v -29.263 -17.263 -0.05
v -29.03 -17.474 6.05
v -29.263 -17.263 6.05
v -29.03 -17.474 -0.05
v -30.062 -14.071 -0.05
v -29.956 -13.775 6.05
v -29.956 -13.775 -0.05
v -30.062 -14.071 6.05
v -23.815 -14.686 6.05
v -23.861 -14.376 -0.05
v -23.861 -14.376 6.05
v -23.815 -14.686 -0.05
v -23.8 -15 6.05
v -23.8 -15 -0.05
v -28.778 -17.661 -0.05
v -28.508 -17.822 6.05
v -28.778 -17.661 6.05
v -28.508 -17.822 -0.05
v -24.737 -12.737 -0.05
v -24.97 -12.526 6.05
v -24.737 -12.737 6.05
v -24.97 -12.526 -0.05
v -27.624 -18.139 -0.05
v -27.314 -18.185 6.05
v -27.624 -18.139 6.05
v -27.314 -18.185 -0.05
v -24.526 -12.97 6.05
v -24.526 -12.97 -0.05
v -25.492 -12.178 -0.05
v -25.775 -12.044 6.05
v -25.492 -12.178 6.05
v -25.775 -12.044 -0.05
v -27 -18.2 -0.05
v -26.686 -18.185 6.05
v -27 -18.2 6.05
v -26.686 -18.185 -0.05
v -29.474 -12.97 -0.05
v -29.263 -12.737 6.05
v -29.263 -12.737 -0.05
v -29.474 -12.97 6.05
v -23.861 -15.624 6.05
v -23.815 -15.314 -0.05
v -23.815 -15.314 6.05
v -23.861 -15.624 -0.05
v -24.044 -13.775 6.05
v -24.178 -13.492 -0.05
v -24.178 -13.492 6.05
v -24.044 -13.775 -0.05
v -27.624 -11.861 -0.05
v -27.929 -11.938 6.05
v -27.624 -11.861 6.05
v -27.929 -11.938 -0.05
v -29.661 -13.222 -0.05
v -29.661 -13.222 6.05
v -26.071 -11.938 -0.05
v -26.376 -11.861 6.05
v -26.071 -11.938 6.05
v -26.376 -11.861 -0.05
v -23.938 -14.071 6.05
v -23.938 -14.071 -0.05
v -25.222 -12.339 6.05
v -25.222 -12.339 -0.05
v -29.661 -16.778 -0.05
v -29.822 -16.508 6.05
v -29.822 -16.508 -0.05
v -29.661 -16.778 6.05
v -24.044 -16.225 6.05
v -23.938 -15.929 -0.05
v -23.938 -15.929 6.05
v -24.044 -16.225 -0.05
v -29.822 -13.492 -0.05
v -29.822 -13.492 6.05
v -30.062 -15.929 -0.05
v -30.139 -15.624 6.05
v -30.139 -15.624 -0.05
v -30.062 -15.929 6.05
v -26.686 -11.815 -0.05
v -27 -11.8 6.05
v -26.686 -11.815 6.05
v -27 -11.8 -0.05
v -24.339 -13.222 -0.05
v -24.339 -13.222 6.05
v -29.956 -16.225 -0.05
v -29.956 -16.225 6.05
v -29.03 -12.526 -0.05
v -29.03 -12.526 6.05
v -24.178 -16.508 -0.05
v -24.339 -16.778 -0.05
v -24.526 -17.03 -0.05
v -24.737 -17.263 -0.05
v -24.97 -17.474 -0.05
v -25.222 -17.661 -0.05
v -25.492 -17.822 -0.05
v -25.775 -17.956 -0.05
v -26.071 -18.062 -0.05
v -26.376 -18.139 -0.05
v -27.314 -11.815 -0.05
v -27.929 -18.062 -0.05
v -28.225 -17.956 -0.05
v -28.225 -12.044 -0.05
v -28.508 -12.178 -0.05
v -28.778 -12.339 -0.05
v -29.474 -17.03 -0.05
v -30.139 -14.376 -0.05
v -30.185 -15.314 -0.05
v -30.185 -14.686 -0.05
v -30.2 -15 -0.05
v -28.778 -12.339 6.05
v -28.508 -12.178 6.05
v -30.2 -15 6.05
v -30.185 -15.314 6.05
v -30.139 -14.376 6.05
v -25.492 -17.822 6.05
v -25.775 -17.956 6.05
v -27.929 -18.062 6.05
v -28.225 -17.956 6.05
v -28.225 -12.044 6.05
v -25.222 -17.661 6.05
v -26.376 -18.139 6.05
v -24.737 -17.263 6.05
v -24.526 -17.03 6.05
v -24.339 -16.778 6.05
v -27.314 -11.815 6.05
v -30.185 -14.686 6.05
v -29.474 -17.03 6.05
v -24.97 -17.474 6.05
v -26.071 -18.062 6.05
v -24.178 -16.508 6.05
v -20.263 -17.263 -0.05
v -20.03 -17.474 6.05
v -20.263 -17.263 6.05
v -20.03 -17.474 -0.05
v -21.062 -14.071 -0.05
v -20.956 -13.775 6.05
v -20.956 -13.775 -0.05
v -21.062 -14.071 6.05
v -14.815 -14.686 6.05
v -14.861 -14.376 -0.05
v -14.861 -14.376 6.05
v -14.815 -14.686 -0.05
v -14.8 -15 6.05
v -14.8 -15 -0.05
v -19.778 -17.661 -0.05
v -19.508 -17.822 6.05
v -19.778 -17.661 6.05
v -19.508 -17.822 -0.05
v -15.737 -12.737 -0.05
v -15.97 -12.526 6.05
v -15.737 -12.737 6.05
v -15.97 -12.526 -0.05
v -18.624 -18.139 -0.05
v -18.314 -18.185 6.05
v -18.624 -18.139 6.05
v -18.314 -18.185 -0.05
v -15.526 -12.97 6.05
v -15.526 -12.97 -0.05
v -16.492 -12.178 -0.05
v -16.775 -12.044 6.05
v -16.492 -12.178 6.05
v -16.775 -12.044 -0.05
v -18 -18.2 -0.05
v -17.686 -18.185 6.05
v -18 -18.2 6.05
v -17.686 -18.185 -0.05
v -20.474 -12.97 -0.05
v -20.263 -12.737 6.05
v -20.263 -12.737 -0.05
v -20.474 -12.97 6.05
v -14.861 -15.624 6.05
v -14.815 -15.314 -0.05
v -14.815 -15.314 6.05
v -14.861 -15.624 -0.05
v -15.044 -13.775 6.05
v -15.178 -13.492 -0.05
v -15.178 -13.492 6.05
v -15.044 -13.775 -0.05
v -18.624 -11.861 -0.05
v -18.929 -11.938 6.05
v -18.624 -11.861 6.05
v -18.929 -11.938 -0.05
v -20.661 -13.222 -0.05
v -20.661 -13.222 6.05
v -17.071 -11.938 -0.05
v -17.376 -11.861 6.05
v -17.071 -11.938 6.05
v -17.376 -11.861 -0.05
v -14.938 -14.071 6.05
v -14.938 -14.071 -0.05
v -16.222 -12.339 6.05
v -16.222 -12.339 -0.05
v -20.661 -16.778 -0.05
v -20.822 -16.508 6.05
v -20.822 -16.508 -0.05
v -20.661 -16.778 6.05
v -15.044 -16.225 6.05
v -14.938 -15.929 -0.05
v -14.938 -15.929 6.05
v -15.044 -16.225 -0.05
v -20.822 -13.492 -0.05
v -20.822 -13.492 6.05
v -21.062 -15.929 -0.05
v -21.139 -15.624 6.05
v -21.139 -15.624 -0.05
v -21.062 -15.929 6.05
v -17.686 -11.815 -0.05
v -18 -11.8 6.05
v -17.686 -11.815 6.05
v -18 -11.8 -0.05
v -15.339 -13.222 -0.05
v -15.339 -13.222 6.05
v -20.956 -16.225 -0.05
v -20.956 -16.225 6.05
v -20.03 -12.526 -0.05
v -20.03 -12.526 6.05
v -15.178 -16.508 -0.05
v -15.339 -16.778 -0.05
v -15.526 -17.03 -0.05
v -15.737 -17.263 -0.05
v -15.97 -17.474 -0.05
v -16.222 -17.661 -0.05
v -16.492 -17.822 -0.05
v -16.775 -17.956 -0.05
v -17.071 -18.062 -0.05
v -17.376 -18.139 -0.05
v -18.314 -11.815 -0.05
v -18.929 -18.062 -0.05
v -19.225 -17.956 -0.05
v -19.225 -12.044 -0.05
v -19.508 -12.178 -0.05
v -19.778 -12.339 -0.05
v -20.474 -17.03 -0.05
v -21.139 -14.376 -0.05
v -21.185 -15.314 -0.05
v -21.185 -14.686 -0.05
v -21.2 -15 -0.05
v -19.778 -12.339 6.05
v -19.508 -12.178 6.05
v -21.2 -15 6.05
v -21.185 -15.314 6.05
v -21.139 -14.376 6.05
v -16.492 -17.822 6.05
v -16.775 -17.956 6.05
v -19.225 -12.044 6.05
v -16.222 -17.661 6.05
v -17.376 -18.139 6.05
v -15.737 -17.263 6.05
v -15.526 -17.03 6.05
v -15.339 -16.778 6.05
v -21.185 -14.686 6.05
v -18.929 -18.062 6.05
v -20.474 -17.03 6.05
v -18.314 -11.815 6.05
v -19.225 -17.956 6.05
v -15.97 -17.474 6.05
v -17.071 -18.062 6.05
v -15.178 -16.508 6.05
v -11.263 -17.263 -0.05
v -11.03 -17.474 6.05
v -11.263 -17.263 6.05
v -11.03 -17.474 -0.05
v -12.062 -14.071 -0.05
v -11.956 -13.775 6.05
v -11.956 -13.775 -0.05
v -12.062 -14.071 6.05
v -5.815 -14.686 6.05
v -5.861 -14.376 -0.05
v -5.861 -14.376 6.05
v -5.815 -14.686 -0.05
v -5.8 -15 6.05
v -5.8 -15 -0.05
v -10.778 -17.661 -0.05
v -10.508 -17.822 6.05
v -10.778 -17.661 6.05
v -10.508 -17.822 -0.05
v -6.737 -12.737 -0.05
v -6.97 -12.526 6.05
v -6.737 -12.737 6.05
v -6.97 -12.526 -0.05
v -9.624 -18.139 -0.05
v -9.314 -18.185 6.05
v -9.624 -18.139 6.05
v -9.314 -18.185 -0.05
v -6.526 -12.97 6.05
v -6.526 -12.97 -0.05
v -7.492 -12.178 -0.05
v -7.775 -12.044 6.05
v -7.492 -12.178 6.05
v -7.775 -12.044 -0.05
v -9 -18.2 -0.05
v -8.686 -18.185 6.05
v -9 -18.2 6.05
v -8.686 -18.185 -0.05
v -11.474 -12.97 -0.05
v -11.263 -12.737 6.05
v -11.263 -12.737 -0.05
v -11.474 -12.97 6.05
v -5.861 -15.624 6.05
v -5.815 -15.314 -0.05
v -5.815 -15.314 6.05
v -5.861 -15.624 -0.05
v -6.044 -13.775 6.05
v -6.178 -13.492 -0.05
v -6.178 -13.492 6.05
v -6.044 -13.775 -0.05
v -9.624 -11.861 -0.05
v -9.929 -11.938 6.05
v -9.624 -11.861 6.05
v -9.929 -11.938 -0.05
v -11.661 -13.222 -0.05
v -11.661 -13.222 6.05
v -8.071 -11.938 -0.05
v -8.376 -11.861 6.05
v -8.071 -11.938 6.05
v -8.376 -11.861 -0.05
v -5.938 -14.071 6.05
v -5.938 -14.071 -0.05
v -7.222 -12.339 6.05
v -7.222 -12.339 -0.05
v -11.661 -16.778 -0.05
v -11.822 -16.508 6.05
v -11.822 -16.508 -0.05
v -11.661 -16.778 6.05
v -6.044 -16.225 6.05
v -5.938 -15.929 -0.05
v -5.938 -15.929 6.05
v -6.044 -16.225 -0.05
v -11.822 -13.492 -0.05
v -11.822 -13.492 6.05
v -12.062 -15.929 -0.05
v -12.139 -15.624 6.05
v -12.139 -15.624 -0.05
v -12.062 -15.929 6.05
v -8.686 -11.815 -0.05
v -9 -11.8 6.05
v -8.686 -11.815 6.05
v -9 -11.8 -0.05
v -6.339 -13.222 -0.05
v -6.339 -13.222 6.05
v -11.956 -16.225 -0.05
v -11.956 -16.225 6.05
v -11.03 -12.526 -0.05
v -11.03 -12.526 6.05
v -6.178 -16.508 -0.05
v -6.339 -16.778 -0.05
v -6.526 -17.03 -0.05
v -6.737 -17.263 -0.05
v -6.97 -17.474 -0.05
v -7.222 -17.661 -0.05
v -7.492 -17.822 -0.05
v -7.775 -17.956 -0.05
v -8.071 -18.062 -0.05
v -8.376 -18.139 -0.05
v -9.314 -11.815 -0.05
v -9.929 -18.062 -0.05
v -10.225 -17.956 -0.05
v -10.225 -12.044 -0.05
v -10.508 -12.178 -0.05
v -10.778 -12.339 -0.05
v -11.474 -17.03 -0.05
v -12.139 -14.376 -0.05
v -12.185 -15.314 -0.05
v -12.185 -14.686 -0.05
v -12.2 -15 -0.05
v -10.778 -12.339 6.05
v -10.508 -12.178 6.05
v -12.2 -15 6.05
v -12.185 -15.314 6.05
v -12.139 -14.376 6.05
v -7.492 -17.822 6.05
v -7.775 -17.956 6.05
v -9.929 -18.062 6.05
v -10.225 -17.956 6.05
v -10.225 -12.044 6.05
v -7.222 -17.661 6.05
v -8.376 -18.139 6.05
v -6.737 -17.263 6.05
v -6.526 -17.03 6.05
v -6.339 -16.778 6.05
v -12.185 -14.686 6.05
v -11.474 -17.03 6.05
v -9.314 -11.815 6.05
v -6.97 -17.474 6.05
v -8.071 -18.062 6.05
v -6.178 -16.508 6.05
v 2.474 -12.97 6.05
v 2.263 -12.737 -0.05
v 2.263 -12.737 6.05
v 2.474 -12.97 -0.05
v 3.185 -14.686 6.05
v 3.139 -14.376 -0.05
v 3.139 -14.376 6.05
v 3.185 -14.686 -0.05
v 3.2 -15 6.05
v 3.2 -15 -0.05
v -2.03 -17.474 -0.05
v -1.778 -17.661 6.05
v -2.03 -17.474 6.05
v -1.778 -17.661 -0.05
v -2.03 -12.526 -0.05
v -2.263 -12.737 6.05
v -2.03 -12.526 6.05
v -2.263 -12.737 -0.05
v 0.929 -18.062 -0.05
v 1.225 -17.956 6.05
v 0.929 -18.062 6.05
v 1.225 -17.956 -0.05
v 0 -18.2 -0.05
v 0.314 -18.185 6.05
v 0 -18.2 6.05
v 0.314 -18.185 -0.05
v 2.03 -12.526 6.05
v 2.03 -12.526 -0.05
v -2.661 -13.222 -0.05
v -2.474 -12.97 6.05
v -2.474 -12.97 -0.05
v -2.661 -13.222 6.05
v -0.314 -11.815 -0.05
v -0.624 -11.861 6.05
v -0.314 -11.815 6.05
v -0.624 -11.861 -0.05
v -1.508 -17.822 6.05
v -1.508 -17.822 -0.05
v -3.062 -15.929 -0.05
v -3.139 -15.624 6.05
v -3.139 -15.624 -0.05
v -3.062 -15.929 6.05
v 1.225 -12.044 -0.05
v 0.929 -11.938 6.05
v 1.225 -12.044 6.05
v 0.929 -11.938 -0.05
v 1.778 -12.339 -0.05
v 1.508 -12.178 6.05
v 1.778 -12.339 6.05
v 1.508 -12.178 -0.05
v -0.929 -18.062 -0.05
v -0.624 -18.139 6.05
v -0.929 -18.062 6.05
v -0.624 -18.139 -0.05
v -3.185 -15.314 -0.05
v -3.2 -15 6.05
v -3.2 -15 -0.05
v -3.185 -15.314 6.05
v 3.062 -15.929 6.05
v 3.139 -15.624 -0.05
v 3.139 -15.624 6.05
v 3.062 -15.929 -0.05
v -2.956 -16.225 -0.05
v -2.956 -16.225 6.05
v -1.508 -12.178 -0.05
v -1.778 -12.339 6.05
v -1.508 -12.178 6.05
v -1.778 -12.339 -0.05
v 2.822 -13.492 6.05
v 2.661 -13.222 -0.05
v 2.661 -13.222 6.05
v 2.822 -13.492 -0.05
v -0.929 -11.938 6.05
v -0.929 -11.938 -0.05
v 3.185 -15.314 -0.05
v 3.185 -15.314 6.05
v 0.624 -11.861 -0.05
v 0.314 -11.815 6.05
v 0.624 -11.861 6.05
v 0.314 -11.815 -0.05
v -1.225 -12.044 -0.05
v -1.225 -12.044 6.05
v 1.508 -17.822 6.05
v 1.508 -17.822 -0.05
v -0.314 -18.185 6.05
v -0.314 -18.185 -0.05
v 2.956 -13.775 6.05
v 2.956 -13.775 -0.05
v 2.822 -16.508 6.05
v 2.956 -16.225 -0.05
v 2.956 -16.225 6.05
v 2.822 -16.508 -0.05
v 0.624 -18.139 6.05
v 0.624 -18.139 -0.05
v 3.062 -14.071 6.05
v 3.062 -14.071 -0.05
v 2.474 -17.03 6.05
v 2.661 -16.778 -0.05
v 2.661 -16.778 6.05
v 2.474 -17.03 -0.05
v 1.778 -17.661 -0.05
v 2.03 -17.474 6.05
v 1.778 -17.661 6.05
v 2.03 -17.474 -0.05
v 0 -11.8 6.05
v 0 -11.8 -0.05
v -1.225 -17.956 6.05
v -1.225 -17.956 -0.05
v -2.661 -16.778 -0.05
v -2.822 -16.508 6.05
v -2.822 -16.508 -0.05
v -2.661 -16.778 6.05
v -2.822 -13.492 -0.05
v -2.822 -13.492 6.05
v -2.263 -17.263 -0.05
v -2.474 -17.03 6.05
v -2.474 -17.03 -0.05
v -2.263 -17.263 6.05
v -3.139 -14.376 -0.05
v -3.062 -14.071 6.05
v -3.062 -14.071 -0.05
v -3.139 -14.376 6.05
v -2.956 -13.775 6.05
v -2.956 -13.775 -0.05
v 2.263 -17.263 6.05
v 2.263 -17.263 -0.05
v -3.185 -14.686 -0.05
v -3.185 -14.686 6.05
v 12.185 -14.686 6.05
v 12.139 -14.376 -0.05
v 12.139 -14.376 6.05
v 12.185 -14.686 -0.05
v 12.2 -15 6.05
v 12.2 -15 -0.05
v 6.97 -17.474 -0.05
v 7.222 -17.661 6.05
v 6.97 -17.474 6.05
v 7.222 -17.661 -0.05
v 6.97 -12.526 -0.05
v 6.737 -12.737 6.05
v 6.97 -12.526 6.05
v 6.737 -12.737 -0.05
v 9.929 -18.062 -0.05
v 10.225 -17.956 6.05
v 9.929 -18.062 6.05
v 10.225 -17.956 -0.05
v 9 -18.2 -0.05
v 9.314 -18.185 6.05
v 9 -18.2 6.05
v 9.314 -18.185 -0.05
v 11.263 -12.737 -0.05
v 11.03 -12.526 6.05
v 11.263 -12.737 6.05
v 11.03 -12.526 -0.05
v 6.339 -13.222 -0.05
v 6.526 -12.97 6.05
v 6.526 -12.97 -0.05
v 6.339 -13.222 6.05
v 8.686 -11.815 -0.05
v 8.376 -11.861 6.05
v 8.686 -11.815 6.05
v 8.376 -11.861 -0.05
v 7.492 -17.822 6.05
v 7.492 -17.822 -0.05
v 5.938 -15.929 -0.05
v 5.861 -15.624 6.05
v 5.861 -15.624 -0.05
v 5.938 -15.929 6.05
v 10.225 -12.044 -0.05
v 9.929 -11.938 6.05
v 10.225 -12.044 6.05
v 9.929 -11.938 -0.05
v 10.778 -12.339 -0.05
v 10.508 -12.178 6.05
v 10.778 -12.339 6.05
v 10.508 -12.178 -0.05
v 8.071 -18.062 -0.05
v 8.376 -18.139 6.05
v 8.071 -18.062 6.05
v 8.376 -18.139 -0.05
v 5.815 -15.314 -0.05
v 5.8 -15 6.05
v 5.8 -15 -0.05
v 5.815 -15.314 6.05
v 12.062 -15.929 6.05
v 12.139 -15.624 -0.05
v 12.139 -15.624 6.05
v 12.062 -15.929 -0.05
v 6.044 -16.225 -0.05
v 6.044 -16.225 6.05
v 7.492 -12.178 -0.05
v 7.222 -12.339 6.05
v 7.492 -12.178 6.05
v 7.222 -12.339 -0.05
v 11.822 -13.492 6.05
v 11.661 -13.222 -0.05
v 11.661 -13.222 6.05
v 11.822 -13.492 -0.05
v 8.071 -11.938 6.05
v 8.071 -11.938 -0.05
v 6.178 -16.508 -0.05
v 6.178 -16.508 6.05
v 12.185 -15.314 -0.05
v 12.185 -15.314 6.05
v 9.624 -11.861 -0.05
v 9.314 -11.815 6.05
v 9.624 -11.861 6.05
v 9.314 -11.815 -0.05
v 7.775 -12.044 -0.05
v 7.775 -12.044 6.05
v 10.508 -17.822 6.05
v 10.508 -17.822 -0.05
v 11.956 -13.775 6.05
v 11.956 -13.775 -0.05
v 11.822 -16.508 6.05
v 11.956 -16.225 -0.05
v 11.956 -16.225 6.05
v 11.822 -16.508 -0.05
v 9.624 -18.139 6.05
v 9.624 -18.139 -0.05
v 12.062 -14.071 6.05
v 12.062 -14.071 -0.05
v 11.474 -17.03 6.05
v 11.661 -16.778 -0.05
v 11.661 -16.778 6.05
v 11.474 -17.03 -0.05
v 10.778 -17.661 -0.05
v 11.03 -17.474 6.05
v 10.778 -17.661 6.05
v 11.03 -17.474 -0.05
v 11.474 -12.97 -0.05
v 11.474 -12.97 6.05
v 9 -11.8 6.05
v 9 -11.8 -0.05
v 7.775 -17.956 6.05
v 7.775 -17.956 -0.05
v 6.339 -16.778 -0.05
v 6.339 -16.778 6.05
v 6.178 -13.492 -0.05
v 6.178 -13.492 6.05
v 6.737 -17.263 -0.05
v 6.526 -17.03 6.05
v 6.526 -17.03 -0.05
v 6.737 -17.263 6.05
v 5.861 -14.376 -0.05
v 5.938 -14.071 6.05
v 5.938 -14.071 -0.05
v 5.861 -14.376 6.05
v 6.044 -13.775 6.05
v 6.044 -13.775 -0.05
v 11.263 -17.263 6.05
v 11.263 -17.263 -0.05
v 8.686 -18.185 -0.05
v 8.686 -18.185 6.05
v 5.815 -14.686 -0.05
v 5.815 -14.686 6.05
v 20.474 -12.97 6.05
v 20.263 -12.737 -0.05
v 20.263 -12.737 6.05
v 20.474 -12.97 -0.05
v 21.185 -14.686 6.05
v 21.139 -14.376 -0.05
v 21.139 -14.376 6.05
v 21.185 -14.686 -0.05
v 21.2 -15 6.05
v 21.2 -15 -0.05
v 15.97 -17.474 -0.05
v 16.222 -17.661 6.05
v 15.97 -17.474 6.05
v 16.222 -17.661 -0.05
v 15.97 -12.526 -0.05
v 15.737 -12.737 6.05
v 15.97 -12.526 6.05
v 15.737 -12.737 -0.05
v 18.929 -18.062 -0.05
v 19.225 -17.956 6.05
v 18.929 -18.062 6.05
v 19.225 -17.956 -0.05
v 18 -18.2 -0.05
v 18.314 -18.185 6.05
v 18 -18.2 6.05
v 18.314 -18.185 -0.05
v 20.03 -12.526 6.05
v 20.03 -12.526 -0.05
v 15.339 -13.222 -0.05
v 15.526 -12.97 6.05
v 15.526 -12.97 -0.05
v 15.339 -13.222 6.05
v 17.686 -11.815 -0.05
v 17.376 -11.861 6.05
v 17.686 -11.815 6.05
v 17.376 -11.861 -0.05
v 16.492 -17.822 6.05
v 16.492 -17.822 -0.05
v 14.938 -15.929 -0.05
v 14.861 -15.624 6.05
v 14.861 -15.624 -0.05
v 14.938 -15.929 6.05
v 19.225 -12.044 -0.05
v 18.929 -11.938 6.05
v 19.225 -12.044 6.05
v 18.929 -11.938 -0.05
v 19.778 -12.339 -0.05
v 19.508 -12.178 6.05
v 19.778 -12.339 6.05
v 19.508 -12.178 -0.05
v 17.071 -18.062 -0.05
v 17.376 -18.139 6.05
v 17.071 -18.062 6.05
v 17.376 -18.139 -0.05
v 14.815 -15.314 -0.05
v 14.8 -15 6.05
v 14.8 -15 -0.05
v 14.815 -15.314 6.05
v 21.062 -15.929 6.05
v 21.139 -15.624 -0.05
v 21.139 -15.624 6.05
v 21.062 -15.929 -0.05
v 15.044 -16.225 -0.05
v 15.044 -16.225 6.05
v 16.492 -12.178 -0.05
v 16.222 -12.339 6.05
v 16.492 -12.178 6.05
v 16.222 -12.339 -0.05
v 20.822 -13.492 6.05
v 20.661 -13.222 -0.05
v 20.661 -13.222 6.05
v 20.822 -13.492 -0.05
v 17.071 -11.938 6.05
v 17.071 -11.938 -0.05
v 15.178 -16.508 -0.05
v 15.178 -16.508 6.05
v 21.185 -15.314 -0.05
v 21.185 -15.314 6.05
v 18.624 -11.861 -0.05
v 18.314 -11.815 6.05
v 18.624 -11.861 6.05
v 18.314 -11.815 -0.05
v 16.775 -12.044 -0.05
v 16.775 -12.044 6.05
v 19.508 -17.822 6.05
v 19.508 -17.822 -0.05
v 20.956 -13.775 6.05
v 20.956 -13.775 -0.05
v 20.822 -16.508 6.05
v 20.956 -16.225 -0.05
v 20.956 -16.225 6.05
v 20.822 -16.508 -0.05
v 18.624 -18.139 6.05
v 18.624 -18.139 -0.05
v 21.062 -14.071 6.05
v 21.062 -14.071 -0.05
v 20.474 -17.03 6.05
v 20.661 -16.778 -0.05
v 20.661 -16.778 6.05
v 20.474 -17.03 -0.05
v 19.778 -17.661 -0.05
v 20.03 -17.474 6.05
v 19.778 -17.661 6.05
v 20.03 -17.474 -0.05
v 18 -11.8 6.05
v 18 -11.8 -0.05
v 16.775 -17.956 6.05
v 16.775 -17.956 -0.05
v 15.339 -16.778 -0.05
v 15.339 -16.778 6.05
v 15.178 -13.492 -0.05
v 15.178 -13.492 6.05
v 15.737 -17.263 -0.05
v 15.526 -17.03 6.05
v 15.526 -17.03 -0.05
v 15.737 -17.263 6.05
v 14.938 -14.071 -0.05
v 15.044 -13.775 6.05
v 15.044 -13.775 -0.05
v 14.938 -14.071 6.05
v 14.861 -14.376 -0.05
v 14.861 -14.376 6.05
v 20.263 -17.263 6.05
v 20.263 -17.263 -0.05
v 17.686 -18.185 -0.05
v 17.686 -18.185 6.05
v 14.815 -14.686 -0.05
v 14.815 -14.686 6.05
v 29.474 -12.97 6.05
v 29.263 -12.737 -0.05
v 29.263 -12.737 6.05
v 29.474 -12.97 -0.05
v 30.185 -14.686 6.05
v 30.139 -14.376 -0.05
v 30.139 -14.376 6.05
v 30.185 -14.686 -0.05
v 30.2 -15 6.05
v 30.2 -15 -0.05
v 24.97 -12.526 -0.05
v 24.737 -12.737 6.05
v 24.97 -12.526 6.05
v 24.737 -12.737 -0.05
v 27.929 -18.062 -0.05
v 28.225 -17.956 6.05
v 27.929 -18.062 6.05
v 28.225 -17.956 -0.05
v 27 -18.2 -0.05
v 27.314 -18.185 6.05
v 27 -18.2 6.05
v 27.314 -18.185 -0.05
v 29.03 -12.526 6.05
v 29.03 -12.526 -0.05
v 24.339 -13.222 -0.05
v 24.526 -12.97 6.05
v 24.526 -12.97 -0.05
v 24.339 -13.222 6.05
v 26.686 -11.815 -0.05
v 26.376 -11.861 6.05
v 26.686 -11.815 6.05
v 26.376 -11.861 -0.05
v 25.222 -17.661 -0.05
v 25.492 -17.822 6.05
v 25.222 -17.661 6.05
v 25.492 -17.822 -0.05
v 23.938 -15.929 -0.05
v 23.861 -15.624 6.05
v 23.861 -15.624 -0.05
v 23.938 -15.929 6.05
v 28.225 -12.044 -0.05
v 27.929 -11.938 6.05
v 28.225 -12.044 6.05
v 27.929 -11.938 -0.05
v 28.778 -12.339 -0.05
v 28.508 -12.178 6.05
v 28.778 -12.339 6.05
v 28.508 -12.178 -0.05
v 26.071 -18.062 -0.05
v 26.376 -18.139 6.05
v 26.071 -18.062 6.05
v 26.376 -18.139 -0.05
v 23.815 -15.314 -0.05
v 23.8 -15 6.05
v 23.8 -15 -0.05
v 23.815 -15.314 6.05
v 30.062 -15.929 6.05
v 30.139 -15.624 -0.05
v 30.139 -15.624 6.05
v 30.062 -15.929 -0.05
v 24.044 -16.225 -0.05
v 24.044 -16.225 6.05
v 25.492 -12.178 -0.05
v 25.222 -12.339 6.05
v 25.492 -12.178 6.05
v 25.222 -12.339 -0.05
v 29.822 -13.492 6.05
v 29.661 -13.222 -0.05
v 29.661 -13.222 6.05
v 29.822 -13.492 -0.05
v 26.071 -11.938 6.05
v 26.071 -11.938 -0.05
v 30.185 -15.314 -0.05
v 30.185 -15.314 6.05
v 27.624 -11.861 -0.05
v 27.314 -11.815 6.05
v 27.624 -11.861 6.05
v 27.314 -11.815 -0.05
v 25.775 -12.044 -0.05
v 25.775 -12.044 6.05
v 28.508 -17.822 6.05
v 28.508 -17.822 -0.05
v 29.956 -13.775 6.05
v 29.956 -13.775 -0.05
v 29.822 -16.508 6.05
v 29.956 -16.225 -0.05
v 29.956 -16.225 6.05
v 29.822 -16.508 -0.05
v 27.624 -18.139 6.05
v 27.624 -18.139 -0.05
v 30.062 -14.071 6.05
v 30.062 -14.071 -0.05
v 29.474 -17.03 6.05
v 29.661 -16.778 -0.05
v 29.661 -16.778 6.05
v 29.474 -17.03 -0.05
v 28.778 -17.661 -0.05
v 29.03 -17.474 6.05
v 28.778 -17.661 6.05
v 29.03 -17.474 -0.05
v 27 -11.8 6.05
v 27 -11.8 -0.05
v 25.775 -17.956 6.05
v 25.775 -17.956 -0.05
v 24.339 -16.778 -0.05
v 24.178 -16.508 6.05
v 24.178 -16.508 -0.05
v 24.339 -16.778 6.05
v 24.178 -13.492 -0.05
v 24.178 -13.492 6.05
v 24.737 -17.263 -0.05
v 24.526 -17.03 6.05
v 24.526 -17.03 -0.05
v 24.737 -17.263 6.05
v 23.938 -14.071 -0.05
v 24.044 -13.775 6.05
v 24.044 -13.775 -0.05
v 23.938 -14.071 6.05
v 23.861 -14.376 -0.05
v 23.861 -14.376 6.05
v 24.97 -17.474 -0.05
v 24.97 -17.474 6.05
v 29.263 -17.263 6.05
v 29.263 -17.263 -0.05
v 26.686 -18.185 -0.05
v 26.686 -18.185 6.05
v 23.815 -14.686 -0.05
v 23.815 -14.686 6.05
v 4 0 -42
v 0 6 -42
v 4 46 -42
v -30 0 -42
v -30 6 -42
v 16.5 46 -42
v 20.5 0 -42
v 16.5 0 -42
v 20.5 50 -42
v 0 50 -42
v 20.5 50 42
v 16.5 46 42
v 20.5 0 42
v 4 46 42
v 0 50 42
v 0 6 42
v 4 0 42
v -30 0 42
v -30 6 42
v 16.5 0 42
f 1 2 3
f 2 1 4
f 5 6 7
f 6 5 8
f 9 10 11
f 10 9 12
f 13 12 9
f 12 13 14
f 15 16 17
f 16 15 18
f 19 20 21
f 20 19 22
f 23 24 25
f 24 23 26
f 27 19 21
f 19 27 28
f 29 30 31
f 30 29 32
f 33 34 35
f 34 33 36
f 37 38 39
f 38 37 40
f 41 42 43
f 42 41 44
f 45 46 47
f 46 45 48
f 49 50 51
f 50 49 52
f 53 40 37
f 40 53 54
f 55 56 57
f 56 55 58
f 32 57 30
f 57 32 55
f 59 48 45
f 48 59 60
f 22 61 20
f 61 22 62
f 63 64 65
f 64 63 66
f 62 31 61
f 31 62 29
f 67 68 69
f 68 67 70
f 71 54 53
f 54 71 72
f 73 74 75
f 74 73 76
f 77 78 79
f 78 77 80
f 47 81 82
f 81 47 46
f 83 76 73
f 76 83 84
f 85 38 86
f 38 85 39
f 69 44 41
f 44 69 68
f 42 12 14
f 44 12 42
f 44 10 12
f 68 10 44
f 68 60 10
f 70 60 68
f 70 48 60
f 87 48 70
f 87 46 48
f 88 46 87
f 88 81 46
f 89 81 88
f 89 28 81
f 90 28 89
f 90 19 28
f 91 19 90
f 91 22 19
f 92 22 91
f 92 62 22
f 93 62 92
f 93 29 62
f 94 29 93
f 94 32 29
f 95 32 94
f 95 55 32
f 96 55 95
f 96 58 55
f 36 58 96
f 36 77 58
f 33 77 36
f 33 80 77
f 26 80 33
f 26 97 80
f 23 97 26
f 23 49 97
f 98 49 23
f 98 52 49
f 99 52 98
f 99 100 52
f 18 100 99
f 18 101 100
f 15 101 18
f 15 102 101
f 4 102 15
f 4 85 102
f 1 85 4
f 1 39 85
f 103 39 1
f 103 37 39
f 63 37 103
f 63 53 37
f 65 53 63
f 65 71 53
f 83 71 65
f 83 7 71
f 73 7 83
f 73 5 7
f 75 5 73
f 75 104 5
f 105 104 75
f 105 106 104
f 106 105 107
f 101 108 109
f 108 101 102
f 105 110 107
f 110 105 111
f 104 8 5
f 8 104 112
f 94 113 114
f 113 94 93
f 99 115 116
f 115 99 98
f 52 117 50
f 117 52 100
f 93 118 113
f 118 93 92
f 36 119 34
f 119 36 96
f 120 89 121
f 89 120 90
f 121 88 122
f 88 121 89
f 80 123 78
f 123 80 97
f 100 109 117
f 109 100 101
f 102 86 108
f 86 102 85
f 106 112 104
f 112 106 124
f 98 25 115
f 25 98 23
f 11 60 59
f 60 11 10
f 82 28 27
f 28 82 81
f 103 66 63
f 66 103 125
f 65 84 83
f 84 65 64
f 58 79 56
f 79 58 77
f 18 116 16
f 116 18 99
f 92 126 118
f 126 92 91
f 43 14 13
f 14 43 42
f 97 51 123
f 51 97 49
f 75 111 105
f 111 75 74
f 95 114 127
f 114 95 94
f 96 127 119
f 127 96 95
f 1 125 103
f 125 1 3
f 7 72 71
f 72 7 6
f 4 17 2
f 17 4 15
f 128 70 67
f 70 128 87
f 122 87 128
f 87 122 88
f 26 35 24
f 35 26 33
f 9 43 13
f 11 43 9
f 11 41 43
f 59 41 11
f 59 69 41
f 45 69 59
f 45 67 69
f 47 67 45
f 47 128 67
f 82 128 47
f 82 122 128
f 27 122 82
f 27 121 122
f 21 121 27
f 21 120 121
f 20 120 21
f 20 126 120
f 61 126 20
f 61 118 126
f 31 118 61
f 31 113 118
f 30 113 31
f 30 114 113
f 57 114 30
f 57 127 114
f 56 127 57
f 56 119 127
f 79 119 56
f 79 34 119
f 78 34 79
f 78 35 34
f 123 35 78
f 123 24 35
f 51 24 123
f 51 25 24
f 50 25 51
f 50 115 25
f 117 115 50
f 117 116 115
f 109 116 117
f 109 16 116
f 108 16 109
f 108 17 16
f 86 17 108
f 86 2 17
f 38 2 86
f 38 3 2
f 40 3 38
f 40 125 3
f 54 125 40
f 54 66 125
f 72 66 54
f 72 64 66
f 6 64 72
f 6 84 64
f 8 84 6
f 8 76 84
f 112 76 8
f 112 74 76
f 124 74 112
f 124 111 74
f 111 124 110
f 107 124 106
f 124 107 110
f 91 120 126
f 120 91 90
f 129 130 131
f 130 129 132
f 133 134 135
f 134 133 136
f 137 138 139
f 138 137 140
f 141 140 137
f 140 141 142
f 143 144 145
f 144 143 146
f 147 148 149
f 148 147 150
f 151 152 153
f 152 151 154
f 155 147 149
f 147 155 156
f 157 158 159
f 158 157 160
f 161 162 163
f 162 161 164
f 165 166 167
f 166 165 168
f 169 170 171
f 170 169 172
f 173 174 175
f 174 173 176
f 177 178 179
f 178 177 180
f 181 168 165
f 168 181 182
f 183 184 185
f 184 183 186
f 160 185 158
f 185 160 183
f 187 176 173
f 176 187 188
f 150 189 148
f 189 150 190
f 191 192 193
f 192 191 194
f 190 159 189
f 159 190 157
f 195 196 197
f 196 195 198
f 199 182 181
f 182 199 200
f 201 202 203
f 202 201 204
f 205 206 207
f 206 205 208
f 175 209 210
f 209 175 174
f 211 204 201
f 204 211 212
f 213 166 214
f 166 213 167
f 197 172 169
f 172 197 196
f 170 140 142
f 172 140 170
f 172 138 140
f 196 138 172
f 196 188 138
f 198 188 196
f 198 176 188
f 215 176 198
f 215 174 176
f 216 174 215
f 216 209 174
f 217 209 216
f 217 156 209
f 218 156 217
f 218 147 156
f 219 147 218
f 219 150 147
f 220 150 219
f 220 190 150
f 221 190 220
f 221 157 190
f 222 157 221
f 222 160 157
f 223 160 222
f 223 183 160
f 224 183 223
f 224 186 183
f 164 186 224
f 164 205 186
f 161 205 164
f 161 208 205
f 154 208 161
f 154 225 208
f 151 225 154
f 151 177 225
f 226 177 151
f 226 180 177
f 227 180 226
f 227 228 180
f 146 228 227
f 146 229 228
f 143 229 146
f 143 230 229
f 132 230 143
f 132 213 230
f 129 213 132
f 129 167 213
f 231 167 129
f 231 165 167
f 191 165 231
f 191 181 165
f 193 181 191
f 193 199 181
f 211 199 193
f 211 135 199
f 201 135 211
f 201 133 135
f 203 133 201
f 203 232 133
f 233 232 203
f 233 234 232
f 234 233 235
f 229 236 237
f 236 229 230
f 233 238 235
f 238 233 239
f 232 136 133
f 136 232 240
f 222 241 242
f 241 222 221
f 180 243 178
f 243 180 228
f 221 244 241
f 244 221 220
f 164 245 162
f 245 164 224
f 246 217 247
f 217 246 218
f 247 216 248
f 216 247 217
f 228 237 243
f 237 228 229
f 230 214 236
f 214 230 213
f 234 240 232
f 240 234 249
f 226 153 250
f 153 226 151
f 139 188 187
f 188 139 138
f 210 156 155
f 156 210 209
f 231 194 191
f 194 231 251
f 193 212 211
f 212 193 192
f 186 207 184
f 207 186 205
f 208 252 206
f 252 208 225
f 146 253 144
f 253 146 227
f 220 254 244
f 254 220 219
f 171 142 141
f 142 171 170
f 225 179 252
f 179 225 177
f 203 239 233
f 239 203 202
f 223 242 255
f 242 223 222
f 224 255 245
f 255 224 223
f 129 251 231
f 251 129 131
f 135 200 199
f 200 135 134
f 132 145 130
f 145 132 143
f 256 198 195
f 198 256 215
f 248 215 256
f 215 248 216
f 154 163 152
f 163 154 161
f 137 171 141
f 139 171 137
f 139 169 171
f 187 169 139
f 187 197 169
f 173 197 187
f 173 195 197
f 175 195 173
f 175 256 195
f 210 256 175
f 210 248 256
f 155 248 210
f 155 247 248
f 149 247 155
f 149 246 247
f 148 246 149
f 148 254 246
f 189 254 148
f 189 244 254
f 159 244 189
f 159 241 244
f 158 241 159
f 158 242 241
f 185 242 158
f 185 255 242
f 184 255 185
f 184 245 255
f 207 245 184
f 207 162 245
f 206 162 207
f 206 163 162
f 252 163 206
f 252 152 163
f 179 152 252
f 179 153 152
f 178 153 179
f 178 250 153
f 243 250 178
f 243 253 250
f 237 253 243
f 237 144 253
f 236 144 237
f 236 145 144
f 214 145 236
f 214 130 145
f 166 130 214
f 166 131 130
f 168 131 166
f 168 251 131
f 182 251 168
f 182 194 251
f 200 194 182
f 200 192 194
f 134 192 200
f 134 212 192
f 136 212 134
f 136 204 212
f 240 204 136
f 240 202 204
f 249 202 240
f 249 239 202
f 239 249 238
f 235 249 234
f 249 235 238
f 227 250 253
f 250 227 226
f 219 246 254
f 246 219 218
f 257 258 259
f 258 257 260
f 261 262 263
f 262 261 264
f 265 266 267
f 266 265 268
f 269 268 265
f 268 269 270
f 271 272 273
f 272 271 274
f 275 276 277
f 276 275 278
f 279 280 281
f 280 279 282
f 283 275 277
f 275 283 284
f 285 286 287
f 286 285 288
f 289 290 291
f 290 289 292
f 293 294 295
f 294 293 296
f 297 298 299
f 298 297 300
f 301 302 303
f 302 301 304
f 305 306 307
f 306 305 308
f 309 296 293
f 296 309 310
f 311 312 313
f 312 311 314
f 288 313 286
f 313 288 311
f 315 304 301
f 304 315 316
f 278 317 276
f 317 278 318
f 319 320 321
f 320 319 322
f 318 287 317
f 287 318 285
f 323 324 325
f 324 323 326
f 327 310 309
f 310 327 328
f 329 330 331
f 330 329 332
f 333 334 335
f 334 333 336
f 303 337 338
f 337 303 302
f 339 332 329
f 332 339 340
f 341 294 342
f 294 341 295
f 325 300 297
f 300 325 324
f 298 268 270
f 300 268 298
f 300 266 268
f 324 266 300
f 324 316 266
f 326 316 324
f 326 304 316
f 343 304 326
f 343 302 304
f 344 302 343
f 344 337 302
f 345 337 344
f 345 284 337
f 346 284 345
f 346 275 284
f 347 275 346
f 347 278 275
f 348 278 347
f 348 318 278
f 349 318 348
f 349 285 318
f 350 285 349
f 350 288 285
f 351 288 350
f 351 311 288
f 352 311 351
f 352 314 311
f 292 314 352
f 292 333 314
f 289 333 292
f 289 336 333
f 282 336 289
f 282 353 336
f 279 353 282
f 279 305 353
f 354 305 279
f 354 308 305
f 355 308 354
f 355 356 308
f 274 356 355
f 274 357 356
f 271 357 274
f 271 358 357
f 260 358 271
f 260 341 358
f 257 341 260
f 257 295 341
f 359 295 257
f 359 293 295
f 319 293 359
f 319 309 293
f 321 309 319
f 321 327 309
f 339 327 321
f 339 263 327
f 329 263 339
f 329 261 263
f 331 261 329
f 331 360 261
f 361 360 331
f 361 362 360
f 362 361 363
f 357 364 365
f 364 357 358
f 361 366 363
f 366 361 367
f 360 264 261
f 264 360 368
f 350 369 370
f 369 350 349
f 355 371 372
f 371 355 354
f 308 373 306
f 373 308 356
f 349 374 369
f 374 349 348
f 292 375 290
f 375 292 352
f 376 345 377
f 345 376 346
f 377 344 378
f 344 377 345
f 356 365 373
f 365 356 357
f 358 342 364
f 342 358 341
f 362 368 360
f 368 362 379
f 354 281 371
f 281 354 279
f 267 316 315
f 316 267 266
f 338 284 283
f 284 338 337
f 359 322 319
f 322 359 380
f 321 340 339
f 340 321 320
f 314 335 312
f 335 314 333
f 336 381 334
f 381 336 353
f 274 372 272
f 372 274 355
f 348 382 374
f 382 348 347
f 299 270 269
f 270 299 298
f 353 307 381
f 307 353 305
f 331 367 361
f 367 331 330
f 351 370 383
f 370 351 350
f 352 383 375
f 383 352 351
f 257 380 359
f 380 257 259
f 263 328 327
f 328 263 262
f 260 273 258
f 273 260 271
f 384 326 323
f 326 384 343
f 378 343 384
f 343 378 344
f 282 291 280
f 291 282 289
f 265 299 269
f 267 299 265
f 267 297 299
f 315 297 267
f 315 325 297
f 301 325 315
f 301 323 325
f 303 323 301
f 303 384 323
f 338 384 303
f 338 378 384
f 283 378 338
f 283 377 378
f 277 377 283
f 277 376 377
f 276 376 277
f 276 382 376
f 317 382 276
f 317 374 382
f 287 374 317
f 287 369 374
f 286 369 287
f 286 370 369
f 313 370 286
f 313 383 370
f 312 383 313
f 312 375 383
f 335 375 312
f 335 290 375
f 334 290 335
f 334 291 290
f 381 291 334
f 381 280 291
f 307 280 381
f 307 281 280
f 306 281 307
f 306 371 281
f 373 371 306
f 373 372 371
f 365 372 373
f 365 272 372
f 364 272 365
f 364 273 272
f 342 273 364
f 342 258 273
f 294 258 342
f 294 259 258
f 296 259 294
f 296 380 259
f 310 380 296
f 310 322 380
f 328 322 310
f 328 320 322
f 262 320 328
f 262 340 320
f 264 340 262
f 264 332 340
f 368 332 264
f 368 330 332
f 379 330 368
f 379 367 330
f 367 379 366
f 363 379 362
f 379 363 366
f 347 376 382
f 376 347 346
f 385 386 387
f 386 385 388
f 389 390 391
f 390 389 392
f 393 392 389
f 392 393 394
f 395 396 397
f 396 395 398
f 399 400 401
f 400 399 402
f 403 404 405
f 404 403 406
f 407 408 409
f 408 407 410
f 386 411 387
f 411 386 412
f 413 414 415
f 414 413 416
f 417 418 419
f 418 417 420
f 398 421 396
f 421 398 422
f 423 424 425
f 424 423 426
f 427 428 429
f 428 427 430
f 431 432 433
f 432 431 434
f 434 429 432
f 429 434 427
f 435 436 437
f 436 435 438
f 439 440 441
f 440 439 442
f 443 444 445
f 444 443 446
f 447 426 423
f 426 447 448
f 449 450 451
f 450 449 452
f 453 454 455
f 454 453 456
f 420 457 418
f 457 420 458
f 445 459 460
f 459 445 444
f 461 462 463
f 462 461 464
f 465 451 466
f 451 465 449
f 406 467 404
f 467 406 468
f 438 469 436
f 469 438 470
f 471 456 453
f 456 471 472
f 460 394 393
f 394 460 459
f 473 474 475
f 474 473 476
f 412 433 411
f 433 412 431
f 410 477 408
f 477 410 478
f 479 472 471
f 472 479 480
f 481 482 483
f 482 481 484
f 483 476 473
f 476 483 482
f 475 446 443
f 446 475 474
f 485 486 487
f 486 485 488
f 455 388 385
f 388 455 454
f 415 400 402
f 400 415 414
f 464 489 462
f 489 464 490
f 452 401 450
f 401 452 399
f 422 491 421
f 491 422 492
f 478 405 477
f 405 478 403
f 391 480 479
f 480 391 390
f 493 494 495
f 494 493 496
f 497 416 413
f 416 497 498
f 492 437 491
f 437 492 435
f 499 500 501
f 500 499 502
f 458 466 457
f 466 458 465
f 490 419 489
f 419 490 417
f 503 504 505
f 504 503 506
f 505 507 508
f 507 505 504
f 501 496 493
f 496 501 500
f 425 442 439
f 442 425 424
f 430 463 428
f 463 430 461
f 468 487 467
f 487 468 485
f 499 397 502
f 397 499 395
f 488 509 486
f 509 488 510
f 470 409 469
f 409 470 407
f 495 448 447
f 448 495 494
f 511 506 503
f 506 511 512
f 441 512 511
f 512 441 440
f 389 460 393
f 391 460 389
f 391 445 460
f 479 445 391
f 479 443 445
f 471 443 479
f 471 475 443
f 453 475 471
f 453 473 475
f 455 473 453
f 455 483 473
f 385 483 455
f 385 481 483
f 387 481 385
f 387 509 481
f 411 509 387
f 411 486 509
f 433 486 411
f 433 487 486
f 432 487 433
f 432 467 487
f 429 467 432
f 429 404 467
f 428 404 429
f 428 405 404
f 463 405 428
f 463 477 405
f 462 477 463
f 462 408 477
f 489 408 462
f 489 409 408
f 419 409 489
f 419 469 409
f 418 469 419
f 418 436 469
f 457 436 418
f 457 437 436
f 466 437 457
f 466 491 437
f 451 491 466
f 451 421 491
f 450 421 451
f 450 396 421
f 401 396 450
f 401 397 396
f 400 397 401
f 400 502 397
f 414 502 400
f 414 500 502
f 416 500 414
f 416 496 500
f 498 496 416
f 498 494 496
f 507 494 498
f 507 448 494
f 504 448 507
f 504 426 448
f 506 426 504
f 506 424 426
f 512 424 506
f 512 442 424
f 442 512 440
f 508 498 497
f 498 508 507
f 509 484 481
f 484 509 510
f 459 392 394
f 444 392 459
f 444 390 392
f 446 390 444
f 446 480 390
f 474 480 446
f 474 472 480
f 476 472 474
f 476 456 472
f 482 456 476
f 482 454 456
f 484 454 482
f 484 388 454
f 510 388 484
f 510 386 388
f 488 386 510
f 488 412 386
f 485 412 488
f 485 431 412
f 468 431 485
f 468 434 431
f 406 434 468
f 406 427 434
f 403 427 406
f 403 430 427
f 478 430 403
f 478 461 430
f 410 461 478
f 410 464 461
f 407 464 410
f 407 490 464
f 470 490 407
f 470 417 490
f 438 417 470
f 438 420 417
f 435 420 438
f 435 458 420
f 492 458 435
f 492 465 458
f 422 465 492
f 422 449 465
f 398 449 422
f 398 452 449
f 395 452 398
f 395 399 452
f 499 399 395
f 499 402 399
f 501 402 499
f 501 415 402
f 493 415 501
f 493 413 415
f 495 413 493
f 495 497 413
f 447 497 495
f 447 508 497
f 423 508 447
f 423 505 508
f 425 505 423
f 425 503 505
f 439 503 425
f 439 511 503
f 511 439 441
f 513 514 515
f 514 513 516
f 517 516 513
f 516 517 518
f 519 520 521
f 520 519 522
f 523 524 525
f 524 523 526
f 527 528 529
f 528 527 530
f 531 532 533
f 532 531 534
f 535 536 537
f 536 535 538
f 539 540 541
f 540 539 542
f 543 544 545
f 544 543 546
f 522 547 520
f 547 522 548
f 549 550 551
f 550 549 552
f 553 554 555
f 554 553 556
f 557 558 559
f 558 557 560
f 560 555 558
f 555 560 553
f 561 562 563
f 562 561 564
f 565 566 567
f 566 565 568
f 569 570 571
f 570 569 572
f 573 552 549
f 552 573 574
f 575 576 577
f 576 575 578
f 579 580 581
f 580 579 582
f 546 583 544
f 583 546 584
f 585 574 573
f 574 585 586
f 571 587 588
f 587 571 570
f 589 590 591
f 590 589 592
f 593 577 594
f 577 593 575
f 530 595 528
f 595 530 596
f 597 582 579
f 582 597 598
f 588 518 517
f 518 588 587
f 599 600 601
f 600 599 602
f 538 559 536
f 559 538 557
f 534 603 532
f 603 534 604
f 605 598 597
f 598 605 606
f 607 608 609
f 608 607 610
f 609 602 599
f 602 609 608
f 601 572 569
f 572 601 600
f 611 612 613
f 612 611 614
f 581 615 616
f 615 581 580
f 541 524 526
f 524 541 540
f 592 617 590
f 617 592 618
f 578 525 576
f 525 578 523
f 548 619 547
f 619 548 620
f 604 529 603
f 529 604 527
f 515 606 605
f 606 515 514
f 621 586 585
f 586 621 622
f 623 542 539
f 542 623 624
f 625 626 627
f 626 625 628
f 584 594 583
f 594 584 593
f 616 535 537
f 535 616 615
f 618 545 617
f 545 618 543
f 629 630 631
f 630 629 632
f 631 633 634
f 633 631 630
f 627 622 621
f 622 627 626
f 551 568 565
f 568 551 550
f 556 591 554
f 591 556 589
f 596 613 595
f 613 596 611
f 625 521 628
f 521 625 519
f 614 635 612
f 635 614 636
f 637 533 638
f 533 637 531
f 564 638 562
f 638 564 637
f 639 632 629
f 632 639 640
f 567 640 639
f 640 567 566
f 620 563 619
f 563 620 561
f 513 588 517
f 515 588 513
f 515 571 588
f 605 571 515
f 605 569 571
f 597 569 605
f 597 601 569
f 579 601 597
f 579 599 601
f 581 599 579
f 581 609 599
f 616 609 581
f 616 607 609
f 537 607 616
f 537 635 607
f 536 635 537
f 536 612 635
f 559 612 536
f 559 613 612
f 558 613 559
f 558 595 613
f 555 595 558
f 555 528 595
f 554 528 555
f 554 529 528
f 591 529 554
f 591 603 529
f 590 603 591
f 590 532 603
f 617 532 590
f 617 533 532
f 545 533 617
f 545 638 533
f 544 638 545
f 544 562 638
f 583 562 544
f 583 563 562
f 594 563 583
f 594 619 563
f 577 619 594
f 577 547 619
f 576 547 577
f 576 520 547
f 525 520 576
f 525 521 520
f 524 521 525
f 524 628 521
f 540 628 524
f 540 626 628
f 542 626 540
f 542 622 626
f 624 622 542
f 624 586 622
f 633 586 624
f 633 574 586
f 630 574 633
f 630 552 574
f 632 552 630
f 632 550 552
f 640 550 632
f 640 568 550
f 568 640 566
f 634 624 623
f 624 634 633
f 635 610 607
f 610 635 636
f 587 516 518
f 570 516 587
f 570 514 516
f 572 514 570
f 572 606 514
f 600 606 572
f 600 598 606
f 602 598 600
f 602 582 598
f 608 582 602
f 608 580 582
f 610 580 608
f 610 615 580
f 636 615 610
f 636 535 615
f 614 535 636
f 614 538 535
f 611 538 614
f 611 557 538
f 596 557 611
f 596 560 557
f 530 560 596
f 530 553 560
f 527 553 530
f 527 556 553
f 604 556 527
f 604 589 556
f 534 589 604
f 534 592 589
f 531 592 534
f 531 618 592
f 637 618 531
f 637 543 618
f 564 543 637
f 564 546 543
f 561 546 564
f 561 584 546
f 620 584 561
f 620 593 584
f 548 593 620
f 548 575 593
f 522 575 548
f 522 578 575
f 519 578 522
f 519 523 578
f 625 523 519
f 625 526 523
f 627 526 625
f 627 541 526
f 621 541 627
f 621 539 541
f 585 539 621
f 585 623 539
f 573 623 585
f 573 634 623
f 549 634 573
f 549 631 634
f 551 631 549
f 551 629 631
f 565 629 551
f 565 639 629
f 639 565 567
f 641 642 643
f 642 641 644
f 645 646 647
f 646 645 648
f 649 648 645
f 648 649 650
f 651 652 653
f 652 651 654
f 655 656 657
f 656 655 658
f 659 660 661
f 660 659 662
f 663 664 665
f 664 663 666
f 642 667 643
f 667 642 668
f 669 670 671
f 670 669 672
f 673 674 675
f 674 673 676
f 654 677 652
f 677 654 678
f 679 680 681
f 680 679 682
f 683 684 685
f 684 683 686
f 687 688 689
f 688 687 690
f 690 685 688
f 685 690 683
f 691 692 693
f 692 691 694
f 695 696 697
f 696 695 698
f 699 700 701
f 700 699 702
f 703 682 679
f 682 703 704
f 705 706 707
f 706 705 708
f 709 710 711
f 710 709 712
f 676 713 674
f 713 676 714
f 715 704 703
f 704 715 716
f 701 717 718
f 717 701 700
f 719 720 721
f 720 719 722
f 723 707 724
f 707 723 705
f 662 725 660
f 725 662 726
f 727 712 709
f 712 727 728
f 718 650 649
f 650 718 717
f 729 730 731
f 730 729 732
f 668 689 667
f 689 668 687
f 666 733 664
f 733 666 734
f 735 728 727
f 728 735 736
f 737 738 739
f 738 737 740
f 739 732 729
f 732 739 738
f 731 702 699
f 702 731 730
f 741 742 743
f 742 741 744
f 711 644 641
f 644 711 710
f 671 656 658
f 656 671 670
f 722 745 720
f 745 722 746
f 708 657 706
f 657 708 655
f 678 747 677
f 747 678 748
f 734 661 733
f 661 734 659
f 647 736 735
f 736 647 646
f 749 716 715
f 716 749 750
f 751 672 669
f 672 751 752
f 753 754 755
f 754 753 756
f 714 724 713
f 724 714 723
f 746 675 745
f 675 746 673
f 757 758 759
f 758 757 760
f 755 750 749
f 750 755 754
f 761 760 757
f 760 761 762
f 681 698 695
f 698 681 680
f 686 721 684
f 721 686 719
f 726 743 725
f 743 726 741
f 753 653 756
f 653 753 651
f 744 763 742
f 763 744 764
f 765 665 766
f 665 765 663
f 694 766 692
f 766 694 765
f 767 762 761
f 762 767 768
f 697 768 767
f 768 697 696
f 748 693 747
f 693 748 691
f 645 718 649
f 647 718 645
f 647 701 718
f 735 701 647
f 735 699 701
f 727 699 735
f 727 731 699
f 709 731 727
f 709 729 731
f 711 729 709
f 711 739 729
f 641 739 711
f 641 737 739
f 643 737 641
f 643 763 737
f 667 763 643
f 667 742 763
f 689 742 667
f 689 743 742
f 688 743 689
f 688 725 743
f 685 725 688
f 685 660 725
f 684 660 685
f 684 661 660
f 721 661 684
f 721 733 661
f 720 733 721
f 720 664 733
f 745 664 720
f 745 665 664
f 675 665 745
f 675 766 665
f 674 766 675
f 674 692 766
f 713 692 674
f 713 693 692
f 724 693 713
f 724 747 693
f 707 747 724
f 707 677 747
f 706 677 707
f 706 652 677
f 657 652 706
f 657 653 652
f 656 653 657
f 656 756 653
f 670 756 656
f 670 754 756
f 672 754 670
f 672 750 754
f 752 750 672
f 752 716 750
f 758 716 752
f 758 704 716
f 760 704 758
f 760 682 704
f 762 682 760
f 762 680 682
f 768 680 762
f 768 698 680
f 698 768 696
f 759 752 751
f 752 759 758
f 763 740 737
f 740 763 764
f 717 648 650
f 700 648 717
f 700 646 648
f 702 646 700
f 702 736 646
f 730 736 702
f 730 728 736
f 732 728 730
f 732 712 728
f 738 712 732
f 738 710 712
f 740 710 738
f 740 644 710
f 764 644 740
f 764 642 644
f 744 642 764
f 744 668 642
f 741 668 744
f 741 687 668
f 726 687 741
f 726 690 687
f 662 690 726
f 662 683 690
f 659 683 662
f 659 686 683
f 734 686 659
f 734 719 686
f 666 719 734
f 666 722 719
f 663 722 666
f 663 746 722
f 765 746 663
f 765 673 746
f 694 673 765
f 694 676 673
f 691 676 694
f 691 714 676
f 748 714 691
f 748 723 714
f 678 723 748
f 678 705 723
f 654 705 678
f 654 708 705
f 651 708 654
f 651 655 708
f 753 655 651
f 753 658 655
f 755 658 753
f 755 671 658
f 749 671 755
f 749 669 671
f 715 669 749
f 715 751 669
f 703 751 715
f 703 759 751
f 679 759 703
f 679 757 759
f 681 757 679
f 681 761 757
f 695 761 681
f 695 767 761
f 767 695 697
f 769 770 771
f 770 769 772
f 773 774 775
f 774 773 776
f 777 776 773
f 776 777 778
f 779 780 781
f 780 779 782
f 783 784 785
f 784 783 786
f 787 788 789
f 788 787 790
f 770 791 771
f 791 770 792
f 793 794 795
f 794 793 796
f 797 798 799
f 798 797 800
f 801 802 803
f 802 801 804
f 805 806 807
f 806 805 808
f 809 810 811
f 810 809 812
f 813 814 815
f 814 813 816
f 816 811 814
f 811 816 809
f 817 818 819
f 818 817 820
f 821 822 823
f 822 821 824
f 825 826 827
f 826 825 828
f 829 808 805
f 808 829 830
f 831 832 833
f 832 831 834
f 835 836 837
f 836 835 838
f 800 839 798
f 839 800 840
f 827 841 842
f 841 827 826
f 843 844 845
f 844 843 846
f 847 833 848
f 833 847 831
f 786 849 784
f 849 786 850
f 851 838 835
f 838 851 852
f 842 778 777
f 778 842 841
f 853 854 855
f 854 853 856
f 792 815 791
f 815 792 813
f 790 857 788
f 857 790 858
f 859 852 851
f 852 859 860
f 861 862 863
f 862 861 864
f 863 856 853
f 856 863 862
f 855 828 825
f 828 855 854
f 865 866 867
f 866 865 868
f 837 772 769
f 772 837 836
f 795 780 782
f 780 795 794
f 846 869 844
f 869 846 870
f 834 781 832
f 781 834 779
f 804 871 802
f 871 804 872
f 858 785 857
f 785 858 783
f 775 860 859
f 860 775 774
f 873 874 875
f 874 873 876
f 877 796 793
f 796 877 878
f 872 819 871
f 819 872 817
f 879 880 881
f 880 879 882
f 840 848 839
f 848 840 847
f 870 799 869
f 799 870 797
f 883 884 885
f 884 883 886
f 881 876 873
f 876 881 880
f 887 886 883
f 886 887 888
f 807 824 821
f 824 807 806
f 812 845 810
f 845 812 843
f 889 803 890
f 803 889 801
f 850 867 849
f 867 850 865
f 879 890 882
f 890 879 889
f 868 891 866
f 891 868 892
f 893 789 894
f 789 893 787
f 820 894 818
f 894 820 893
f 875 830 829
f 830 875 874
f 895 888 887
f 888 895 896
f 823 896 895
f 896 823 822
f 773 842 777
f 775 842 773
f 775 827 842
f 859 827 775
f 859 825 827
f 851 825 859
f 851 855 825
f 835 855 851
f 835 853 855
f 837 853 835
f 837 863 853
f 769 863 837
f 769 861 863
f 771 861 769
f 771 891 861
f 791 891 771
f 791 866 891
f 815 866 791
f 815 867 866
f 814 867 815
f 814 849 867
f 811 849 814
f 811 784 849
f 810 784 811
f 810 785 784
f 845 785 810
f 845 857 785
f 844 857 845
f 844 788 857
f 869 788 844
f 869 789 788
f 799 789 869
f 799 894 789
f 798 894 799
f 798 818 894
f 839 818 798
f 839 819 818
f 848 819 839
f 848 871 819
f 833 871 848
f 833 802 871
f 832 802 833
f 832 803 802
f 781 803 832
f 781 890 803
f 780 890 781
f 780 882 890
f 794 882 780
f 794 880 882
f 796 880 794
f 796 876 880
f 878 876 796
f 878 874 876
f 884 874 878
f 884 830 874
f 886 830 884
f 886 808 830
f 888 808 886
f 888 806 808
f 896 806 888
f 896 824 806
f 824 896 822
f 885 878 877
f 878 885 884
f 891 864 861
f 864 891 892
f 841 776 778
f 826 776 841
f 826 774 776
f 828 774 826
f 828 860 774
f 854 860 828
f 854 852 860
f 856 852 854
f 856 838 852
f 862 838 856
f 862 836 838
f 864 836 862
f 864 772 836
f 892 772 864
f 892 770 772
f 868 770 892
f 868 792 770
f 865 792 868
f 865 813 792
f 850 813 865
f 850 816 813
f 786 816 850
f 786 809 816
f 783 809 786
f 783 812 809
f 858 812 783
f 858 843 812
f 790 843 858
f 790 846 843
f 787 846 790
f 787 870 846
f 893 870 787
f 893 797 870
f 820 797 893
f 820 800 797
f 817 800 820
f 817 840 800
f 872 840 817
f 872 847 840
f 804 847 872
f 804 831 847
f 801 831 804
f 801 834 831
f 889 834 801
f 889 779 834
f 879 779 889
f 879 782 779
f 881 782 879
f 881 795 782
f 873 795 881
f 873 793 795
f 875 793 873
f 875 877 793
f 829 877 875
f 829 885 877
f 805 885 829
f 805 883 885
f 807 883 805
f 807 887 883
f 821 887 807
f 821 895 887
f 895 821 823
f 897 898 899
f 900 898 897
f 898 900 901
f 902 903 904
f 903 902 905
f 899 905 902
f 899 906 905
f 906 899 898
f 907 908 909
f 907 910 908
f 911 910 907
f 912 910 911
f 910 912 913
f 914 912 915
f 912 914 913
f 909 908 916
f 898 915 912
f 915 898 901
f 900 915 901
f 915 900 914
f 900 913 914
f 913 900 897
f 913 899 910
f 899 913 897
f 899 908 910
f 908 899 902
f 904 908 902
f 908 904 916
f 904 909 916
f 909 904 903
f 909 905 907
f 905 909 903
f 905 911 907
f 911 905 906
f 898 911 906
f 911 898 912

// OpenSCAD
// Dimensions (mm)
wall_thickness = 12;
extrusion_length = 84; // along X
inner_leg_y_start = 0;
inner_leg_y_end = 4;
outer_leg_y_start = 16.5;
outer_leg_y_end = 20.5;
leg_z_start = 0;
leg_z_end = 50;
bridge_z_start = 46;
bridge_z_end = 50;
wall_gap = 12.5;
ledge_thickness = 6;
ledge_y_start = -30;
ledge_y_end = 0;
tube_hole_diameter = 6.4;
tube_spacing = 9;
tube_y_pos = -15;

$fn = 64;

// Main profile in YZ plane, extruded along X
// The part is centred on X=0, rests on Z=0, and builds upward.
// Profile is defined in YZ plane.
linear_extrude(height = extrusion_length, center = true)
union() {
    // Inner leg
    translate([inner_leg_y_start, leg_z_start])
        square([inner_leg_y_end - inner_leg_y_start, leg_z_end - leg_z_start]);
    
    // Outer leg
    translate([outer_leg_y_start, leg_z_start])
        square([outer_leg_y_end - outer_leg_y_start, leg_z_end - leg_z_start]);
    
    // Bridge
    translate([inner_leg_y_end, bridge_z_start])
        square([outer_leg_y_start - inner_leg_y_end, bridge_z_end - bridge_z_start]);
    
    // Ledge
    translate([ledge_y_start, leg_z_start])
        square([ledge_y_end - ledge_y_start, ledge_thickness]);
}

// Tube holes
// Holes are through the ledge (z=0 to z=6).
// Centred in X, spaced 9mm apart, at y = -15.
for (i = [-3, -2, -1, 0, 1, 2, 3]) {
    translate([i * tube_spacing, tube_y_pos, ledge_thickness / 2])
        cylinder(h = ledge_thickness + 0.1, r = tube_hole_diameter / 2, center = true);
}
